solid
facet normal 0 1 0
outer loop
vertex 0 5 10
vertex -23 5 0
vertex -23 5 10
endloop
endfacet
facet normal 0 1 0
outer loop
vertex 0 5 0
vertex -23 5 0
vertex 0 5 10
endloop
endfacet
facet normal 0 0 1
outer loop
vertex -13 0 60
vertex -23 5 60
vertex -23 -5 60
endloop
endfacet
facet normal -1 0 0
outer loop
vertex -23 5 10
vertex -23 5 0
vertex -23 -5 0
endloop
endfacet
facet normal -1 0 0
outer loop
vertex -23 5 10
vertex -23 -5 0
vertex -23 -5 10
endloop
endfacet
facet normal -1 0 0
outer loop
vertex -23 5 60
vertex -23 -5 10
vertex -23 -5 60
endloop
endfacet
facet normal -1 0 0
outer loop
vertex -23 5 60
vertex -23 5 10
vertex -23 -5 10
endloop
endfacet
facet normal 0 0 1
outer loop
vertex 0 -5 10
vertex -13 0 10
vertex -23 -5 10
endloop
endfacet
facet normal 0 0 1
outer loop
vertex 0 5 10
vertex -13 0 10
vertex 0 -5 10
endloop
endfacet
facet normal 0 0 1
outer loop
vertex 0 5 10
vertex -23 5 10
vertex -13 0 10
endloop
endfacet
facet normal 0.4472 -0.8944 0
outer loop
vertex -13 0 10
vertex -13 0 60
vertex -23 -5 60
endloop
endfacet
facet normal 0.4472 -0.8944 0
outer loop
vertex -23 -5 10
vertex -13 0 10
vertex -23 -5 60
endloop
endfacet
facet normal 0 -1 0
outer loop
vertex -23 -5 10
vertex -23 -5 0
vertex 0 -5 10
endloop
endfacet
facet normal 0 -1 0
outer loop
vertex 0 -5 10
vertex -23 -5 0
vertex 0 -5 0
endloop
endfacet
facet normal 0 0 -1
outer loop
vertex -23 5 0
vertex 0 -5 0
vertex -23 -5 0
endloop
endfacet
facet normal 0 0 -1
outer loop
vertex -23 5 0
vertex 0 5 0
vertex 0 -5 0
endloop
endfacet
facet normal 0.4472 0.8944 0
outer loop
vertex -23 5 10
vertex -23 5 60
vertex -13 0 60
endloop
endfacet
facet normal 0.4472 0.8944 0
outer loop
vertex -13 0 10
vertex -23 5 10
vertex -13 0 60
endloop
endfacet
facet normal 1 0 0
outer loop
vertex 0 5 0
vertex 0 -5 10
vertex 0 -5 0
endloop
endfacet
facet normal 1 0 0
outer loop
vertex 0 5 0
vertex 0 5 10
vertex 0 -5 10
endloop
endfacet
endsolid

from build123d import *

# Parameters (mm, degrees)
BOSS_EXTRUDE1_DEPTH = 5
CUT_EXTRUDE1_DEPTH  = 50


with BuildPart() as part:
    # Sketch1 → Boss-Extrude1 (new, symmetric)
    with BuildSketch(Plane(origin=(0, 0, 0), x_dir=(1, 0, 0), z_dir=(0, 1, 0))):
        Polygon((0, 0), (-23, 0), (-23, -60), (-13, -60), (-13, -10), (0, -10), align=None)
    extrude(amount=BOSS_EXTRUDE1_DEPTH, both=True)

    # Sketch2 → Cut-Extrude1 (cut)
    with BuildSketch(Plane.XY.offset(60)):
        Polygon((-13, 5), (-23, 5), (-13, 0), align=None)
        Polygon((-13, -5), (-13, 0), (-23, -5), align=None)
    extrude(amount=-CUT_EXTRUDE1_DEPTH, mode=Mode.SUBTRACT)


solid = part.part
